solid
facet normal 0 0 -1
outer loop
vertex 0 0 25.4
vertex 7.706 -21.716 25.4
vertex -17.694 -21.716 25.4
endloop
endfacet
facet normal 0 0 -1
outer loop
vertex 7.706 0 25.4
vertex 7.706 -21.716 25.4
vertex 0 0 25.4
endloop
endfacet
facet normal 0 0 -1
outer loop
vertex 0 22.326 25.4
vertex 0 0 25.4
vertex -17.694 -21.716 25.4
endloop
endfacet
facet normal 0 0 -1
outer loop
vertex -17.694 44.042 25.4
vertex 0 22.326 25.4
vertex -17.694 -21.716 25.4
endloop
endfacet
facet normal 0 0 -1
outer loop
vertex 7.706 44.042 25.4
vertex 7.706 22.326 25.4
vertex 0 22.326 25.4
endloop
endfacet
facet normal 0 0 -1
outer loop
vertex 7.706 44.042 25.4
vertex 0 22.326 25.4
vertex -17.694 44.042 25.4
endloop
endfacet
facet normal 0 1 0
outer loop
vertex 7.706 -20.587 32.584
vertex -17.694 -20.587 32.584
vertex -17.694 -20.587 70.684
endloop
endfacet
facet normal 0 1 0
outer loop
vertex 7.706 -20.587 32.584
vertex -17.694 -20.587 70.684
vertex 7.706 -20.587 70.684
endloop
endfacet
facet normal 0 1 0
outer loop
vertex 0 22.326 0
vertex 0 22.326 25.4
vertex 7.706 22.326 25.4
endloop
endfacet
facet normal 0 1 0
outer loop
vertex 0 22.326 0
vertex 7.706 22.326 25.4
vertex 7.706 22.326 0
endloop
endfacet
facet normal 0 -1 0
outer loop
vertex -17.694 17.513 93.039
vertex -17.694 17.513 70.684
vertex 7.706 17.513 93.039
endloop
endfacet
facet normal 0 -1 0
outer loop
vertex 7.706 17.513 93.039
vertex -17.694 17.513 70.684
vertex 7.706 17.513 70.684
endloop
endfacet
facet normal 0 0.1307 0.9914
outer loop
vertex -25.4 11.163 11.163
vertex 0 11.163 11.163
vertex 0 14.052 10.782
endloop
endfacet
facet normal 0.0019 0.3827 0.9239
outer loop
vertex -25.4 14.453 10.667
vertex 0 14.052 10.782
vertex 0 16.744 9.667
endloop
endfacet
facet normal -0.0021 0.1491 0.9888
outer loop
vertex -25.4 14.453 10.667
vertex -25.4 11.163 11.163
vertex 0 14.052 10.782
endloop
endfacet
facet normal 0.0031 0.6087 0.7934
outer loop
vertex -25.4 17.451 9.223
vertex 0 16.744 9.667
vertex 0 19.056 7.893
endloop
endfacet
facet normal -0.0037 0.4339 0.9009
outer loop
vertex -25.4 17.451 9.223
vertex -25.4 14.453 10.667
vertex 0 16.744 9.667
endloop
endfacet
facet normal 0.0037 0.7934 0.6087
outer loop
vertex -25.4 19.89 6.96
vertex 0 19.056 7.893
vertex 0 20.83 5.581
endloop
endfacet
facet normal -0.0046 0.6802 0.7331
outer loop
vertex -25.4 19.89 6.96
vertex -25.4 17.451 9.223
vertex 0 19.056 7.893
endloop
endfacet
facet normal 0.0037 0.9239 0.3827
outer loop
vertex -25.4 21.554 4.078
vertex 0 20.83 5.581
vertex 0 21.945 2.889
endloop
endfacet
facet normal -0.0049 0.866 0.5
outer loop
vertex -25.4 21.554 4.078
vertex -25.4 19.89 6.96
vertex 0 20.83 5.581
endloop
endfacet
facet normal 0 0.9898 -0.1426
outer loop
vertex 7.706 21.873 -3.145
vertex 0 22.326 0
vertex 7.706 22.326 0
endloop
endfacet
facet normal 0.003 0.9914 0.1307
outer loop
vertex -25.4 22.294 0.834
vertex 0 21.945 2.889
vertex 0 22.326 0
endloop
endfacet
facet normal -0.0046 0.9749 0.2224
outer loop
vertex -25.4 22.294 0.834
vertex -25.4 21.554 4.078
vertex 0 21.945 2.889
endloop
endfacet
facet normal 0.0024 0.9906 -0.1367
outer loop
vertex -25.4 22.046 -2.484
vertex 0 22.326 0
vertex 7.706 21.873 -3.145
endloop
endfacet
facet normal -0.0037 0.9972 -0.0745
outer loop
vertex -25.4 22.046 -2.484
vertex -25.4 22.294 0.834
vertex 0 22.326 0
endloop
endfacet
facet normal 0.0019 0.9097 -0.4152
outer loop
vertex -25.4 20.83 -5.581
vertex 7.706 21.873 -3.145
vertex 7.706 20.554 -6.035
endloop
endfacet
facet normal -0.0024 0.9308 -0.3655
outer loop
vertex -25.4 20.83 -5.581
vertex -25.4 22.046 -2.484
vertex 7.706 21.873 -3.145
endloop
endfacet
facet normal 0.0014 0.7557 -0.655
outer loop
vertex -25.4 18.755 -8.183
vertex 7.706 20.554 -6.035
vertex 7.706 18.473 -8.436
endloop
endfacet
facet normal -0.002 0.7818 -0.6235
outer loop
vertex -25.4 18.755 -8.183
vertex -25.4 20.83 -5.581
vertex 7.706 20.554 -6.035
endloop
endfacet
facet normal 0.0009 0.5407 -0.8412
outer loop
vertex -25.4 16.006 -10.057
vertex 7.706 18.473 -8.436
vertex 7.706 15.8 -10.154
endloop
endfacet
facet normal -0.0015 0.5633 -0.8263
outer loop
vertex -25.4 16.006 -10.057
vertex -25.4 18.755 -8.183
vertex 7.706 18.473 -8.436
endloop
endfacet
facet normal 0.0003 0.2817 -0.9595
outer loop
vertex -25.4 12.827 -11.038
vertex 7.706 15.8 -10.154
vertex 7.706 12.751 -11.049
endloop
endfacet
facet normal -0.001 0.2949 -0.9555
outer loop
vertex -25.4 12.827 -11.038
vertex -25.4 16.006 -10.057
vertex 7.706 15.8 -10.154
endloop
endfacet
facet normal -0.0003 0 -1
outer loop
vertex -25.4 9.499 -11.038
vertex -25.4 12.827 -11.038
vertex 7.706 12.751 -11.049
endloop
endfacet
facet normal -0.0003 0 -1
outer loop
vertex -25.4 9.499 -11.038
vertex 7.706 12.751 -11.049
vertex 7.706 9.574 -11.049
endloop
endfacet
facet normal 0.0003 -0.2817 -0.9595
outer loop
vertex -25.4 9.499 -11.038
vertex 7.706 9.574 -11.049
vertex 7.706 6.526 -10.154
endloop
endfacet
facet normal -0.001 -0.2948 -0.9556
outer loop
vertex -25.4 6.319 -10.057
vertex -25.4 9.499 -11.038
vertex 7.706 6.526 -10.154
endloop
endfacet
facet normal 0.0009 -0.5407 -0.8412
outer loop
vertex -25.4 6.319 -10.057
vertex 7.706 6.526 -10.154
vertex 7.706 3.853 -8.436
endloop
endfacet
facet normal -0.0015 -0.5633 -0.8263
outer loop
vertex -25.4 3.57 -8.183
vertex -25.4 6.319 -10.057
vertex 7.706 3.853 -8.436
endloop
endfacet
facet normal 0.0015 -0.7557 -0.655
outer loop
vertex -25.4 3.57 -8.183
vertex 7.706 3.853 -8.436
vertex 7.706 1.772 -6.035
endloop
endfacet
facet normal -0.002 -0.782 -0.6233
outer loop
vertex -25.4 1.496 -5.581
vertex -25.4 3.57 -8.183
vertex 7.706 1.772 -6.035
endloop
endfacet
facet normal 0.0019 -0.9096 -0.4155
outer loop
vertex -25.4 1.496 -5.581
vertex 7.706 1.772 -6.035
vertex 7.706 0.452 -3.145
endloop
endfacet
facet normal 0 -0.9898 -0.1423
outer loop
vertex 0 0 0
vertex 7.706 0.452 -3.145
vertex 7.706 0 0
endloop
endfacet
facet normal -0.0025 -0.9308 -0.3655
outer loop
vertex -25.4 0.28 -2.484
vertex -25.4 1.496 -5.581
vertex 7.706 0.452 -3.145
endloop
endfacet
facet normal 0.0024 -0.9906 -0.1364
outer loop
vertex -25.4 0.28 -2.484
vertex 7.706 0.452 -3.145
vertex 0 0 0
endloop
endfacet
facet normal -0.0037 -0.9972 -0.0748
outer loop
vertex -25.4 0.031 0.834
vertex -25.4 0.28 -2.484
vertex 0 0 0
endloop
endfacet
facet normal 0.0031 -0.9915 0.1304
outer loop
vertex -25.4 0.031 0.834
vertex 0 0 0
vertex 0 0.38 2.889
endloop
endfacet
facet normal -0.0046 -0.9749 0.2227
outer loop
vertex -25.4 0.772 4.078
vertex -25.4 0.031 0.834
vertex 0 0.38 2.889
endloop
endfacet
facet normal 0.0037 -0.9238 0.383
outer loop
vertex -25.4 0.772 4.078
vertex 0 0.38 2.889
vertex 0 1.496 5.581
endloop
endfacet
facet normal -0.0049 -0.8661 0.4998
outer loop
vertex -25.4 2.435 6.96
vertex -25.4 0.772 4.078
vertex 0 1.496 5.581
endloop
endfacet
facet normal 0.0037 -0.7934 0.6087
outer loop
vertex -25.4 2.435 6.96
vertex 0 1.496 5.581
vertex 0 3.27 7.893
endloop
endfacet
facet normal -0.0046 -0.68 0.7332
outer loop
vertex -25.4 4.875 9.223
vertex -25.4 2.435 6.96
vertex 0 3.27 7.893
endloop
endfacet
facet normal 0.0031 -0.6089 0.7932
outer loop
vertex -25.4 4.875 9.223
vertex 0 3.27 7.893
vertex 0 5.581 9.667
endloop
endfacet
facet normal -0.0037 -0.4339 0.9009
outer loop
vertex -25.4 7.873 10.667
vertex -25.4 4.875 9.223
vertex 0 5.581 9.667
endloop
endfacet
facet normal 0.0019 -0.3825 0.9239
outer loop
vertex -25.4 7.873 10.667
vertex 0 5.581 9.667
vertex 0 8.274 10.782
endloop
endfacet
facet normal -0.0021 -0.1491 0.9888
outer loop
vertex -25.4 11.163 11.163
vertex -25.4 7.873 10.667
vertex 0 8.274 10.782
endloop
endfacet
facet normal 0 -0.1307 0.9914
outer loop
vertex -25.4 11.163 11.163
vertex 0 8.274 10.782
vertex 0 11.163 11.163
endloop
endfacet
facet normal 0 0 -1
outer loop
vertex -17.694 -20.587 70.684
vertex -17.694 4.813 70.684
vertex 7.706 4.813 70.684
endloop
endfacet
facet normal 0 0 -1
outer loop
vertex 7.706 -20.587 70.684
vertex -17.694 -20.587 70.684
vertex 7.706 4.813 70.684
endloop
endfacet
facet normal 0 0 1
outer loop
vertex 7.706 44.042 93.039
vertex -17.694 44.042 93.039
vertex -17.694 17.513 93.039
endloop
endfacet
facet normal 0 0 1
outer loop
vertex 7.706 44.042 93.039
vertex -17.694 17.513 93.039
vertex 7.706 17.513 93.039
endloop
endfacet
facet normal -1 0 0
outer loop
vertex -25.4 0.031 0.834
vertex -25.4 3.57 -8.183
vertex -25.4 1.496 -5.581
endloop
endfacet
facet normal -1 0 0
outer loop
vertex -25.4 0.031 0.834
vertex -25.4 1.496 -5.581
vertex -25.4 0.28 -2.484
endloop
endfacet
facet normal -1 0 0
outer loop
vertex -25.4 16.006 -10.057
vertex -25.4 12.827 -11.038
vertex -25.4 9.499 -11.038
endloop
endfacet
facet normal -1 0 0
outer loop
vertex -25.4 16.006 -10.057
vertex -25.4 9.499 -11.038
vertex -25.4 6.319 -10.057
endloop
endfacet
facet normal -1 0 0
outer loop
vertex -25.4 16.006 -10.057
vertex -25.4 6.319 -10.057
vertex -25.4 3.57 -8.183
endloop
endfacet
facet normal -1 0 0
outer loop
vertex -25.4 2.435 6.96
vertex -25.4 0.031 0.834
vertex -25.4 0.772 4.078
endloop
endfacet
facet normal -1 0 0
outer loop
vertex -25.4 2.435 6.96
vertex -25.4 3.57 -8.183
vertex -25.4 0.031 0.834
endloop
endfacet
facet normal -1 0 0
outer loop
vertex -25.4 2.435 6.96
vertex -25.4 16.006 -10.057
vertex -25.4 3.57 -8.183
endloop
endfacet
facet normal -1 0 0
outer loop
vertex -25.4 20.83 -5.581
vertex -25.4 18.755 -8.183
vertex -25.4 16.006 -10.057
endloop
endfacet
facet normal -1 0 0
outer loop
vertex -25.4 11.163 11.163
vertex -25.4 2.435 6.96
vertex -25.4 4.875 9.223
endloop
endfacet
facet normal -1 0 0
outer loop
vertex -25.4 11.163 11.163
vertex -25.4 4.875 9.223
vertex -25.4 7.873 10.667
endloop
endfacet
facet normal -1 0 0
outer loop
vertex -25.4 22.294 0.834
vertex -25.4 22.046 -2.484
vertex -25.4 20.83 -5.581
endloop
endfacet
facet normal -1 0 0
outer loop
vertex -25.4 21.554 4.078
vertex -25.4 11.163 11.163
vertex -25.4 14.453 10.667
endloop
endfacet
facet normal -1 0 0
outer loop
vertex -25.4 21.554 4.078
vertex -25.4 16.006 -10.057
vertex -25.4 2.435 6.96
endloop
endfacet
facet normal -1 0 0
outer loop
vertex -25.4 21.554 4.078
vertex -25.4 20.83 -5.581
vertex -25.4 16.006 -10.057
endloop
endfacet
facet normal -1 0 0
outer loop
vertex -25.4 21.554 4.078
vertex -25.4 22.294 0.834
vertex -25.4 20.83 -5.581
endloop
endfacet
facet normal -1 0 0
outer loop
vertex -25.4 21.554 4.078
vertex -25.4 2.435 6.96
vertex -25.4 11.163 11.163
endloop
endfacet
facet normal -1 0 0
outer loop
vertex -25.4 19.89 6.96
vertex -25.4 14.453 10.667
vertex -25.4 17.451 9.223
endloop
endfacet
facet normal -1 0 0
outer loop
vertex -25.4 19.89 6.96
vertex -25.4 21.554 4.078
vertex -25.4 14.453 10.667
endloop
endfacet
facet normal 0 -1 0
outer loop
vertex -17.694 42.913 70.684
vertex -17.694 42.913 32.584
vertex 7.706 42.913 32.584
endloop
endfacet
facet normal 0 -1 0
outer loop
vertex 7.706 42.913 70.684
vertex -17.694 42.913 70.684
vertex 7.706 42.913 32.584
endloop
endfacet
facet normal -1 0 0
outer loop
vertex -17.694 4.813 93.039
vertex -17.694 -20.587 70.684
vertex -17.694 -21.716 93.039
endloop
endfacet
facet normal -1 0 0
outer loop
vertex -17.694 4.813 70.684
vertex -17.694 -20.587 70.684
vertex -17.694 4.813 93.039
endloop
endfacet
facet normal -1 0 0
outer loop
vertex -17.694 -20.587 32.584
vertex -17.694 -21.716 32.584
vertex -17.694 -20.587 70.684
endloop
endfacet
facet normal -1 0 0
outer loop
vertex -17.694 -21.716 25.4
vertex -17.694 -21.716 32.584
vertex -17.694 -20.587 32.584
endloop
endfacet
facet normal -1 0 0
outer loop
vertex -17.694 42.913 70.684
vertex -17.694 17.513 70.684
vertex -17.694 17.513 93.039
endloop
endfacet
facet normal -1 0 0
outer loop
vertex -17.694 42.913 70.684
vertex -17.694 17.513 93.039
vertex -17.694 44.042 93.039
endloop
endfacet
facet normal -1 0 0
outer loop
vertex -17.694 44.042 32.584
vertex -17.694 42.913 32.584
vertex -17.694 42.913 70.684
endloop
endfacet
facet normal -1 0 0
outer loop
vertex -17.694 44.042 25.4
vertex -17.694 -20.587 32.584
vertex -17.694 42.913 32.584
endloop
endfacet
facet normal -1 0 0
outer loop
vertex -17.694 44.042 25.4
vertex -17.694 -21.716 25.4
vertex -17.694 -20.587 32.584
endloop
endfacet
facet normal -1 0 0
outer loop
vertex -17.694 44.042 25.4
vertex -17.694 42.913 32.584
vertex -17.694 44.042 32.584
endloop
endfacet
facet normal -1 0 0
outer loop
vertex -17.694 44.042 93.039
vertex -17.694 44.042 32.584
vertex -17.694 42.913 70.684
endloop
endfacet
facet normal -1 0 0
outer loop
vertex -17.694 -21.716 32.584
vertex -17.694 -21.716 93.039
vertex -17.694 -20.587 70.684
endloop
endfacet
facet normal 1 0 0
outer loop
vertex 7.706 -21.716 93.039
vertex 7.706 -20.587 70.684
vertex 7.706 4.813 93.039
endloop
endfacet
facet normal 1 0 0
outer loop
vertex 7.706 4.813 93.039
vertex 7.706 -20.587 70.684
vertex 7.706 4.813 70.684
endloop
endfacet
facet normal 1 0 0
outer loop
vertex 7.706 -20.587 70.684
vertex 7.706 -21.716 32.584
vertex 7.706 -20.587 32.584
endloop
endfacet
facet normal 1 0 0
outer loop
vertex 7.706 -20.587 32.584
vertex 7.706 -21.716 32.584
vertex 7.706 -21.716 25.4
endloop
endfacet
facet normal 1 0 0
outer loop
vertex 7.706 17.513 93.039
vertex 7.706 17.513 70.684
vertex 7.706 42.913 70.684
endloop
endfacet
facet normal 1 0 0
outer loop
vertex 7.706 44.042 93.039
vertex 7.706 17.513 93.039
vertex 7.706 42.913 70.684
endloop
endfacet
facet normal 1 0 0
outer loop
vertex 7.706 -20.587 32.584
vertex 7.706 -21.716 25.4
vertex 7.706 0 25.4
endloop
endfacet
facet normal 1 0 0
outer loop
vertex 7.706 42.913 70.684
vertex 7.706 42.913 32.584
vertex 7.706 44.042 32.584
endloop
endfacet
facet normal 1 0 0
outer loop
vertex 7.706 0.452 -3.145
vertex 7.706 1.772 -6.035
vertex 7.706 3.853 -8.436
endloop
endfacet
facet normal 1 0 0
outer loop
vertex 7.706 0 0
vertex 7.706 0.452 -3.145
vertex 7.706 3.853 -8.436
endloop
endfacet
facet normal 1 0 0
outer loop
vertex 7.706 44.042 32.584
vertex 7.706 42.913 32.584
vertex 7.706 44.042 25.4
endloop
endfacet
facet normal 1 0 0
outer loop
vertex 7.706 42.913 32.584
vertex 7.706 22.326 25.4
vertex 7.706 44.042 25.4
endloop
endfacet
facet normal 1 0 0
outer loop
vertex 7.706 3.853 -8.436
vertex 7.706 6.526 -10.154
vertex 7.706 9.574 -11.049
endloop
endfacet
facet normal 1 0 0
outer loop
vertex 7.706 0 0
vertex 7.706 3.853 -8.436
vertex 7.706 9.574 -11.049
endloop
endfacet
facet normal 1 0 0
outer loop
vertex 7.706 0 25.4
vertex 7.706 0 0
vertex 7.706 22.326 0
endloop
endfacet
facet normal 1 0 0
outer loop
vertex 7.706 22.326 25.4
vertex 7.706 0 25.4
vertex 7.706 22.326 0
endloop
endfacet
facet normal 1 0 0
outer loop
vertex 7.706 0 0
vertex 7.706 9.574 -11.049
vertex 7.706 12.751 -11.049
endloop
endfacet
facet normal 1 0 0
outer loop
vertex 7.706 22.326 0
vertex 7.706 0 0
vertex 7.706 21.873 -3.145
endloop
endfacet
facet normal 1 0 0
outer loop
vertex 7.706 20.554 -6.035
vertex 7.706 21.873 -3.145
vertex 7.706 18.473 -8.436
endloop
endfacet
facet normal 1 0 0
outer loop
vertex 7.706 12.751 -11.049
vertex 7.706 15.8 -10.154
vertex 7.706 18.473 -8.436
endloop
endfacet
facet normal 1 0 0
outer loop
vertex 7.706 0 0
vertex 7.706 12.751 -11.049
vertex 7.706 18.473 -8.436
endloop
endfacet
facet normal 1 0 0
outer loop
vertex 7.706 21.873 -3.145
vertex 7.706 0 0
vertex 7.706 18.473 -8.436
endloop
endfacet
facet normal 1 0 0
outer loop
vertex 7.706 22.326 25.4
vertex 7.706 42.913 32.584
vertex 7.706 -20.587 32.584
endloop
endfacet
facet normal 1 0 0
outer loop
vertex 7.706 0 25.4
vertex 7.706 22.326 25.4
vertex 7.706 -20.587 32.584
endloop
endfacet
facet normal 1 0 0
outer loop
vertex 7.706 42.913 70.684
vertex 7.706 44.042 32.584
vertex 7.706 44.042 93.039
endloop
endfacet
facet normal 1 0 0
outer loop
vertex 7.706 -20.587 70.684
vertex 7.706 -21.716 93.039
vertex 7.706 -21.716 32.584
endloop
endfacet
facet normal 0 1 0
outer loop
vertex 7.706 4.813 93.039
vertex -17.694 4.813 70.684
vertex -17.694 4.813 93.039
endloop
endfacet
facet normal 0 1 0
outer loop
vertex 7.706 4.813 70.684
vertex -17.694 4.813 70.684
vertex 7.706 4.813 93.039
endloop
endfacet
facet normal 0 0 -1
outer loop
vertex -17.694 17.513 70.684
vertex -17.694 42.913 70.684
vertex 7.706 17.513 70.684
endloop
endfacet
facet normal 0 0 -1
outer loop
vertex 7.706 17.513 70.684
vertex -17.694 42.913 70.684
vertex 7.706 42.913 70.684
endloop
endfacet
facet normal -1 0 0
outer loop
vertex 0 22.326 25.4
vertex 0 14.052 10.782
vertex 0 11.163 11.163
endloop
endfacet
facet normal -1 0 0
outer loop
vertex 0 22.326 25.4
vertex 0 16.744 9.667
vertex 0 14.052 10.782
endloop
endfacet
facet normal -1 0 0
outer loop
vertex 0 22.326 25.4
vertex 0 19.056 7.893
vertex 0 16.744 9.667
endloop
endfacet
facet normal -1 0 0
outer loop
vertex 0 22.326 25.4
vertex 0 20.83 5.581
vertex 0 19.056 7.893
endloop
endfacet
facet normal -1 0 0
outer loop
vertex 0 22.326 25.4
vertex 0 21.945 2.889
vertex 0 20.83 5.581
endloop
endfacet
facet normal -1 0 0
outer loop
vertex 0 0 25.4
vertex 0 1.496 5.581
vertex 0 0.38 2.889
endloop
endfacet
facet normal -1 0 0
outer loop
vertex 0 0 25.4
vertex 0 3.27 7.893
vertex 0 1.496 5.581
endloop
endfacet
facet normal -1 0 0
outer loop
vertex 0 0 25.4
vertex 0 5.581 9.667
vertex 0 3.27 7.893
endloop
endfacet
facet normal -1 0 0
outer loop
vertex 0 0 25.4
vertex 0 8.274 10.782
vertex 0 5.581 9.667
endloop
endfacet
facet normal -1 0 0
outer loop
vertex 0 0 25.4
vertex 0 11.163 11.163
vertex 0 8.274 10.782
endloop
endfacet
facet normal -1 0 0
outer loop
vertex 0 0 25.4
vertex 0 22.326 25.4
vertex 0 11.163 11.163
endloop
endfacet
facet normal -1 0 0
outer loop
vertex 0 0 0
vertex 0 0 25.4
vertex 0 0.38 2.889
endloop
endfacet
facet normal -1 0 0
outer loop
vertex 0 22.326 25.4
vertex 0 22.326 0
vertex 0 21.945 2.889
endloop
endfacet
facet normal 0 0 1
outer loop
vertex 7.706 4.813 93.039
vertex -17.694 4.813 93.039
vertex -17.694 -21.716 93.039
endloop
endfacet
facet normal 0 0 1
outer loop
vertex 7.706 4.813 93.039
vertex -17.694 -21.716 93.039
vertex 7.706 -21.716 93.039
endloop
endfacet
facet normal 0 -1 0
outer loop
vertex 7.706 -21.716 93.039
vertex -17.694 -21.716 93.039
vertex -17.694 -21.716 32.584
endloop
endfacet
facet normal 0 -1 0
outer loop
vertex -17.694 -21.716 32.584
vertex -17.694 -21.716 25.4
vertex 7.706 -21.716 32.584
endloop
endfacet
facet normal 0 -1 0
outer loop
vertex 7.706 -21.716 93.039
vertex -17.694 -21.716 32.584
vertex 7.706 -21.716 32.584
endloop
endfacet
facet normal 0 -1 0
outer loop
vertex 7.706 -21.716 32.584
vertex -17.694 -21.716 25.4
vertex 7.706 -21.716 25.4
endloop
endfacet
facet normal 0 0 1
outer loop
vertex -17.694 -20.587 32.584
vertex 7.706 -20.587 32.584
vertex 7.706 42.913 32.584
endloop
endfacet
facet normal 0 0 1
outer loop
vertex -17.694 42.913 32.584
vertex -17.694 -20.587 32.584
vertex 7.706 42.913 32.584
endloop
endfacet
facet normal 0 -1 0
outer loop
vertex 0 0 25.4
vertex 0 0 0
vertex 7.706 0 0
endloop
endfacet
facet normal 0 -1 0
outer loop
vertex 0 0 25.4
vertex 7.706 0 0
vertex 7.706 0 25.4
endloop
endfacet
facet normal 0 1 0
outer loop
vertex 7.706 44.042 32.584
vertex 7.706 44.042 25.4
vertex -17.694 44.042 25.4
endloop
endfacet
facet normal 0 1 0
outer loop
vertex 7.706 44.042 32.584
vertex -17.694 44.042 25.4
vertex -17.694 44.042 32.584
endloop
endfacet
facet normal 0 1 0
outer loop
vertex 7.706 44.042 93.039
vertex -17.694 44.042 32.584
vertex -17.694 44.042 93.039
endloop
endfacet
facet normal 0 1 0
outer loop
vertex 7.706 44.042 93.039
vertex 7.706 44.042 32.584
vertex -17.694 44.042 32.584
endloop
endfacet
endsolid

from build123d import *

# Parameters (mm, degrees)
FEATURE_B_DEPTH     = 7.706067936
FEATURE_START       = 25.4
SKETCH3_R           = 11.162804955
FEATURE_A_DEPTH     = 25.4
SKETCH5_W           = 65.757777778
SKETCH5_H           = 7.184204897
FEATURE_C_DEPTH     = 25.4
SKETCH6_W           = 25.4
SKETCH6_H           = 1.128888889
FEATURE_D_DEPTH     = 38.1
SKETCH8_W           = 25.4
SKETCH8_H           = 26.528888889
BOSS_EXTRUDE5_DEPTH = 22.354838115


with BuildPart() as part:
    # Sketch1 → Feature B (new body)
    with BuildSketch(Plane.YZ):
        with BuildLine():
            Line((0, 0), (0, 25.4))
            Line((0, 25.4), (22.32560991, 25.4))
            Line((22.32560991, 25.4), (22.32560991, 0))
            ThreePointArc((22.32560991, 0), (11.162804955, -11.162804955), (0, 0))
        make_face()
    extrude(amount=FEATURE_B_DEPTH)

    # Sketch3 → Feature A (add)
    with BuildSketch(Plane(origin=(0, 0, 0), x_dir=(0, -1, 0), z_dir=(-1, 0, 0)).offset(FEATURE_START)):
        with Locations(Location((-11.162804955, 0, 0), (0, 0, 90))):
            Circle(SKETCH3_R)
    extrude(amount=-FEATURE_A_DEPTH)

    # Sketch5 → Feature C (add)
    with BuildSketch(Plane.YZ.offset(7.706067936)):
        with Locations((11.162804955, 28.992102448)):
            Rectangle(SKETCH5_W, SKETCH5_H)
    extrude(amount=-FEATURE_C_DEPTH)

    # Sketch6 → Feature D (add)
    with BuildSketch(Plane.XY.offset(32.584204897)):
        with Locations((-4.993932064, -21.151639489)):
            Rectangle(SKETCH6_W, SKETCH6_H)
        with Locations((-4.993932064, 43.4772494)):
            Rectangle(SKETCH6_W, SKETCH6_H)
    extrude(amount=FEATURE_D_DEPTH)

    # Sketch8 → Boss-Extrude5 (add)
    with BuildSketch(Plane.XY.offset(70.684204897)):
        with Locations((-4.993932064, -8.451639489)):
            Rectangle(SKETCH8_W, SKETCH8_H)
        with Locations((-4.993932064, 30.7772494)):
            Rectangle(SKETCH8_W, SKETCH8_H)
    extrude(amount=BOSS_EXTRUDE5_DEPTH)


solid = part.part
